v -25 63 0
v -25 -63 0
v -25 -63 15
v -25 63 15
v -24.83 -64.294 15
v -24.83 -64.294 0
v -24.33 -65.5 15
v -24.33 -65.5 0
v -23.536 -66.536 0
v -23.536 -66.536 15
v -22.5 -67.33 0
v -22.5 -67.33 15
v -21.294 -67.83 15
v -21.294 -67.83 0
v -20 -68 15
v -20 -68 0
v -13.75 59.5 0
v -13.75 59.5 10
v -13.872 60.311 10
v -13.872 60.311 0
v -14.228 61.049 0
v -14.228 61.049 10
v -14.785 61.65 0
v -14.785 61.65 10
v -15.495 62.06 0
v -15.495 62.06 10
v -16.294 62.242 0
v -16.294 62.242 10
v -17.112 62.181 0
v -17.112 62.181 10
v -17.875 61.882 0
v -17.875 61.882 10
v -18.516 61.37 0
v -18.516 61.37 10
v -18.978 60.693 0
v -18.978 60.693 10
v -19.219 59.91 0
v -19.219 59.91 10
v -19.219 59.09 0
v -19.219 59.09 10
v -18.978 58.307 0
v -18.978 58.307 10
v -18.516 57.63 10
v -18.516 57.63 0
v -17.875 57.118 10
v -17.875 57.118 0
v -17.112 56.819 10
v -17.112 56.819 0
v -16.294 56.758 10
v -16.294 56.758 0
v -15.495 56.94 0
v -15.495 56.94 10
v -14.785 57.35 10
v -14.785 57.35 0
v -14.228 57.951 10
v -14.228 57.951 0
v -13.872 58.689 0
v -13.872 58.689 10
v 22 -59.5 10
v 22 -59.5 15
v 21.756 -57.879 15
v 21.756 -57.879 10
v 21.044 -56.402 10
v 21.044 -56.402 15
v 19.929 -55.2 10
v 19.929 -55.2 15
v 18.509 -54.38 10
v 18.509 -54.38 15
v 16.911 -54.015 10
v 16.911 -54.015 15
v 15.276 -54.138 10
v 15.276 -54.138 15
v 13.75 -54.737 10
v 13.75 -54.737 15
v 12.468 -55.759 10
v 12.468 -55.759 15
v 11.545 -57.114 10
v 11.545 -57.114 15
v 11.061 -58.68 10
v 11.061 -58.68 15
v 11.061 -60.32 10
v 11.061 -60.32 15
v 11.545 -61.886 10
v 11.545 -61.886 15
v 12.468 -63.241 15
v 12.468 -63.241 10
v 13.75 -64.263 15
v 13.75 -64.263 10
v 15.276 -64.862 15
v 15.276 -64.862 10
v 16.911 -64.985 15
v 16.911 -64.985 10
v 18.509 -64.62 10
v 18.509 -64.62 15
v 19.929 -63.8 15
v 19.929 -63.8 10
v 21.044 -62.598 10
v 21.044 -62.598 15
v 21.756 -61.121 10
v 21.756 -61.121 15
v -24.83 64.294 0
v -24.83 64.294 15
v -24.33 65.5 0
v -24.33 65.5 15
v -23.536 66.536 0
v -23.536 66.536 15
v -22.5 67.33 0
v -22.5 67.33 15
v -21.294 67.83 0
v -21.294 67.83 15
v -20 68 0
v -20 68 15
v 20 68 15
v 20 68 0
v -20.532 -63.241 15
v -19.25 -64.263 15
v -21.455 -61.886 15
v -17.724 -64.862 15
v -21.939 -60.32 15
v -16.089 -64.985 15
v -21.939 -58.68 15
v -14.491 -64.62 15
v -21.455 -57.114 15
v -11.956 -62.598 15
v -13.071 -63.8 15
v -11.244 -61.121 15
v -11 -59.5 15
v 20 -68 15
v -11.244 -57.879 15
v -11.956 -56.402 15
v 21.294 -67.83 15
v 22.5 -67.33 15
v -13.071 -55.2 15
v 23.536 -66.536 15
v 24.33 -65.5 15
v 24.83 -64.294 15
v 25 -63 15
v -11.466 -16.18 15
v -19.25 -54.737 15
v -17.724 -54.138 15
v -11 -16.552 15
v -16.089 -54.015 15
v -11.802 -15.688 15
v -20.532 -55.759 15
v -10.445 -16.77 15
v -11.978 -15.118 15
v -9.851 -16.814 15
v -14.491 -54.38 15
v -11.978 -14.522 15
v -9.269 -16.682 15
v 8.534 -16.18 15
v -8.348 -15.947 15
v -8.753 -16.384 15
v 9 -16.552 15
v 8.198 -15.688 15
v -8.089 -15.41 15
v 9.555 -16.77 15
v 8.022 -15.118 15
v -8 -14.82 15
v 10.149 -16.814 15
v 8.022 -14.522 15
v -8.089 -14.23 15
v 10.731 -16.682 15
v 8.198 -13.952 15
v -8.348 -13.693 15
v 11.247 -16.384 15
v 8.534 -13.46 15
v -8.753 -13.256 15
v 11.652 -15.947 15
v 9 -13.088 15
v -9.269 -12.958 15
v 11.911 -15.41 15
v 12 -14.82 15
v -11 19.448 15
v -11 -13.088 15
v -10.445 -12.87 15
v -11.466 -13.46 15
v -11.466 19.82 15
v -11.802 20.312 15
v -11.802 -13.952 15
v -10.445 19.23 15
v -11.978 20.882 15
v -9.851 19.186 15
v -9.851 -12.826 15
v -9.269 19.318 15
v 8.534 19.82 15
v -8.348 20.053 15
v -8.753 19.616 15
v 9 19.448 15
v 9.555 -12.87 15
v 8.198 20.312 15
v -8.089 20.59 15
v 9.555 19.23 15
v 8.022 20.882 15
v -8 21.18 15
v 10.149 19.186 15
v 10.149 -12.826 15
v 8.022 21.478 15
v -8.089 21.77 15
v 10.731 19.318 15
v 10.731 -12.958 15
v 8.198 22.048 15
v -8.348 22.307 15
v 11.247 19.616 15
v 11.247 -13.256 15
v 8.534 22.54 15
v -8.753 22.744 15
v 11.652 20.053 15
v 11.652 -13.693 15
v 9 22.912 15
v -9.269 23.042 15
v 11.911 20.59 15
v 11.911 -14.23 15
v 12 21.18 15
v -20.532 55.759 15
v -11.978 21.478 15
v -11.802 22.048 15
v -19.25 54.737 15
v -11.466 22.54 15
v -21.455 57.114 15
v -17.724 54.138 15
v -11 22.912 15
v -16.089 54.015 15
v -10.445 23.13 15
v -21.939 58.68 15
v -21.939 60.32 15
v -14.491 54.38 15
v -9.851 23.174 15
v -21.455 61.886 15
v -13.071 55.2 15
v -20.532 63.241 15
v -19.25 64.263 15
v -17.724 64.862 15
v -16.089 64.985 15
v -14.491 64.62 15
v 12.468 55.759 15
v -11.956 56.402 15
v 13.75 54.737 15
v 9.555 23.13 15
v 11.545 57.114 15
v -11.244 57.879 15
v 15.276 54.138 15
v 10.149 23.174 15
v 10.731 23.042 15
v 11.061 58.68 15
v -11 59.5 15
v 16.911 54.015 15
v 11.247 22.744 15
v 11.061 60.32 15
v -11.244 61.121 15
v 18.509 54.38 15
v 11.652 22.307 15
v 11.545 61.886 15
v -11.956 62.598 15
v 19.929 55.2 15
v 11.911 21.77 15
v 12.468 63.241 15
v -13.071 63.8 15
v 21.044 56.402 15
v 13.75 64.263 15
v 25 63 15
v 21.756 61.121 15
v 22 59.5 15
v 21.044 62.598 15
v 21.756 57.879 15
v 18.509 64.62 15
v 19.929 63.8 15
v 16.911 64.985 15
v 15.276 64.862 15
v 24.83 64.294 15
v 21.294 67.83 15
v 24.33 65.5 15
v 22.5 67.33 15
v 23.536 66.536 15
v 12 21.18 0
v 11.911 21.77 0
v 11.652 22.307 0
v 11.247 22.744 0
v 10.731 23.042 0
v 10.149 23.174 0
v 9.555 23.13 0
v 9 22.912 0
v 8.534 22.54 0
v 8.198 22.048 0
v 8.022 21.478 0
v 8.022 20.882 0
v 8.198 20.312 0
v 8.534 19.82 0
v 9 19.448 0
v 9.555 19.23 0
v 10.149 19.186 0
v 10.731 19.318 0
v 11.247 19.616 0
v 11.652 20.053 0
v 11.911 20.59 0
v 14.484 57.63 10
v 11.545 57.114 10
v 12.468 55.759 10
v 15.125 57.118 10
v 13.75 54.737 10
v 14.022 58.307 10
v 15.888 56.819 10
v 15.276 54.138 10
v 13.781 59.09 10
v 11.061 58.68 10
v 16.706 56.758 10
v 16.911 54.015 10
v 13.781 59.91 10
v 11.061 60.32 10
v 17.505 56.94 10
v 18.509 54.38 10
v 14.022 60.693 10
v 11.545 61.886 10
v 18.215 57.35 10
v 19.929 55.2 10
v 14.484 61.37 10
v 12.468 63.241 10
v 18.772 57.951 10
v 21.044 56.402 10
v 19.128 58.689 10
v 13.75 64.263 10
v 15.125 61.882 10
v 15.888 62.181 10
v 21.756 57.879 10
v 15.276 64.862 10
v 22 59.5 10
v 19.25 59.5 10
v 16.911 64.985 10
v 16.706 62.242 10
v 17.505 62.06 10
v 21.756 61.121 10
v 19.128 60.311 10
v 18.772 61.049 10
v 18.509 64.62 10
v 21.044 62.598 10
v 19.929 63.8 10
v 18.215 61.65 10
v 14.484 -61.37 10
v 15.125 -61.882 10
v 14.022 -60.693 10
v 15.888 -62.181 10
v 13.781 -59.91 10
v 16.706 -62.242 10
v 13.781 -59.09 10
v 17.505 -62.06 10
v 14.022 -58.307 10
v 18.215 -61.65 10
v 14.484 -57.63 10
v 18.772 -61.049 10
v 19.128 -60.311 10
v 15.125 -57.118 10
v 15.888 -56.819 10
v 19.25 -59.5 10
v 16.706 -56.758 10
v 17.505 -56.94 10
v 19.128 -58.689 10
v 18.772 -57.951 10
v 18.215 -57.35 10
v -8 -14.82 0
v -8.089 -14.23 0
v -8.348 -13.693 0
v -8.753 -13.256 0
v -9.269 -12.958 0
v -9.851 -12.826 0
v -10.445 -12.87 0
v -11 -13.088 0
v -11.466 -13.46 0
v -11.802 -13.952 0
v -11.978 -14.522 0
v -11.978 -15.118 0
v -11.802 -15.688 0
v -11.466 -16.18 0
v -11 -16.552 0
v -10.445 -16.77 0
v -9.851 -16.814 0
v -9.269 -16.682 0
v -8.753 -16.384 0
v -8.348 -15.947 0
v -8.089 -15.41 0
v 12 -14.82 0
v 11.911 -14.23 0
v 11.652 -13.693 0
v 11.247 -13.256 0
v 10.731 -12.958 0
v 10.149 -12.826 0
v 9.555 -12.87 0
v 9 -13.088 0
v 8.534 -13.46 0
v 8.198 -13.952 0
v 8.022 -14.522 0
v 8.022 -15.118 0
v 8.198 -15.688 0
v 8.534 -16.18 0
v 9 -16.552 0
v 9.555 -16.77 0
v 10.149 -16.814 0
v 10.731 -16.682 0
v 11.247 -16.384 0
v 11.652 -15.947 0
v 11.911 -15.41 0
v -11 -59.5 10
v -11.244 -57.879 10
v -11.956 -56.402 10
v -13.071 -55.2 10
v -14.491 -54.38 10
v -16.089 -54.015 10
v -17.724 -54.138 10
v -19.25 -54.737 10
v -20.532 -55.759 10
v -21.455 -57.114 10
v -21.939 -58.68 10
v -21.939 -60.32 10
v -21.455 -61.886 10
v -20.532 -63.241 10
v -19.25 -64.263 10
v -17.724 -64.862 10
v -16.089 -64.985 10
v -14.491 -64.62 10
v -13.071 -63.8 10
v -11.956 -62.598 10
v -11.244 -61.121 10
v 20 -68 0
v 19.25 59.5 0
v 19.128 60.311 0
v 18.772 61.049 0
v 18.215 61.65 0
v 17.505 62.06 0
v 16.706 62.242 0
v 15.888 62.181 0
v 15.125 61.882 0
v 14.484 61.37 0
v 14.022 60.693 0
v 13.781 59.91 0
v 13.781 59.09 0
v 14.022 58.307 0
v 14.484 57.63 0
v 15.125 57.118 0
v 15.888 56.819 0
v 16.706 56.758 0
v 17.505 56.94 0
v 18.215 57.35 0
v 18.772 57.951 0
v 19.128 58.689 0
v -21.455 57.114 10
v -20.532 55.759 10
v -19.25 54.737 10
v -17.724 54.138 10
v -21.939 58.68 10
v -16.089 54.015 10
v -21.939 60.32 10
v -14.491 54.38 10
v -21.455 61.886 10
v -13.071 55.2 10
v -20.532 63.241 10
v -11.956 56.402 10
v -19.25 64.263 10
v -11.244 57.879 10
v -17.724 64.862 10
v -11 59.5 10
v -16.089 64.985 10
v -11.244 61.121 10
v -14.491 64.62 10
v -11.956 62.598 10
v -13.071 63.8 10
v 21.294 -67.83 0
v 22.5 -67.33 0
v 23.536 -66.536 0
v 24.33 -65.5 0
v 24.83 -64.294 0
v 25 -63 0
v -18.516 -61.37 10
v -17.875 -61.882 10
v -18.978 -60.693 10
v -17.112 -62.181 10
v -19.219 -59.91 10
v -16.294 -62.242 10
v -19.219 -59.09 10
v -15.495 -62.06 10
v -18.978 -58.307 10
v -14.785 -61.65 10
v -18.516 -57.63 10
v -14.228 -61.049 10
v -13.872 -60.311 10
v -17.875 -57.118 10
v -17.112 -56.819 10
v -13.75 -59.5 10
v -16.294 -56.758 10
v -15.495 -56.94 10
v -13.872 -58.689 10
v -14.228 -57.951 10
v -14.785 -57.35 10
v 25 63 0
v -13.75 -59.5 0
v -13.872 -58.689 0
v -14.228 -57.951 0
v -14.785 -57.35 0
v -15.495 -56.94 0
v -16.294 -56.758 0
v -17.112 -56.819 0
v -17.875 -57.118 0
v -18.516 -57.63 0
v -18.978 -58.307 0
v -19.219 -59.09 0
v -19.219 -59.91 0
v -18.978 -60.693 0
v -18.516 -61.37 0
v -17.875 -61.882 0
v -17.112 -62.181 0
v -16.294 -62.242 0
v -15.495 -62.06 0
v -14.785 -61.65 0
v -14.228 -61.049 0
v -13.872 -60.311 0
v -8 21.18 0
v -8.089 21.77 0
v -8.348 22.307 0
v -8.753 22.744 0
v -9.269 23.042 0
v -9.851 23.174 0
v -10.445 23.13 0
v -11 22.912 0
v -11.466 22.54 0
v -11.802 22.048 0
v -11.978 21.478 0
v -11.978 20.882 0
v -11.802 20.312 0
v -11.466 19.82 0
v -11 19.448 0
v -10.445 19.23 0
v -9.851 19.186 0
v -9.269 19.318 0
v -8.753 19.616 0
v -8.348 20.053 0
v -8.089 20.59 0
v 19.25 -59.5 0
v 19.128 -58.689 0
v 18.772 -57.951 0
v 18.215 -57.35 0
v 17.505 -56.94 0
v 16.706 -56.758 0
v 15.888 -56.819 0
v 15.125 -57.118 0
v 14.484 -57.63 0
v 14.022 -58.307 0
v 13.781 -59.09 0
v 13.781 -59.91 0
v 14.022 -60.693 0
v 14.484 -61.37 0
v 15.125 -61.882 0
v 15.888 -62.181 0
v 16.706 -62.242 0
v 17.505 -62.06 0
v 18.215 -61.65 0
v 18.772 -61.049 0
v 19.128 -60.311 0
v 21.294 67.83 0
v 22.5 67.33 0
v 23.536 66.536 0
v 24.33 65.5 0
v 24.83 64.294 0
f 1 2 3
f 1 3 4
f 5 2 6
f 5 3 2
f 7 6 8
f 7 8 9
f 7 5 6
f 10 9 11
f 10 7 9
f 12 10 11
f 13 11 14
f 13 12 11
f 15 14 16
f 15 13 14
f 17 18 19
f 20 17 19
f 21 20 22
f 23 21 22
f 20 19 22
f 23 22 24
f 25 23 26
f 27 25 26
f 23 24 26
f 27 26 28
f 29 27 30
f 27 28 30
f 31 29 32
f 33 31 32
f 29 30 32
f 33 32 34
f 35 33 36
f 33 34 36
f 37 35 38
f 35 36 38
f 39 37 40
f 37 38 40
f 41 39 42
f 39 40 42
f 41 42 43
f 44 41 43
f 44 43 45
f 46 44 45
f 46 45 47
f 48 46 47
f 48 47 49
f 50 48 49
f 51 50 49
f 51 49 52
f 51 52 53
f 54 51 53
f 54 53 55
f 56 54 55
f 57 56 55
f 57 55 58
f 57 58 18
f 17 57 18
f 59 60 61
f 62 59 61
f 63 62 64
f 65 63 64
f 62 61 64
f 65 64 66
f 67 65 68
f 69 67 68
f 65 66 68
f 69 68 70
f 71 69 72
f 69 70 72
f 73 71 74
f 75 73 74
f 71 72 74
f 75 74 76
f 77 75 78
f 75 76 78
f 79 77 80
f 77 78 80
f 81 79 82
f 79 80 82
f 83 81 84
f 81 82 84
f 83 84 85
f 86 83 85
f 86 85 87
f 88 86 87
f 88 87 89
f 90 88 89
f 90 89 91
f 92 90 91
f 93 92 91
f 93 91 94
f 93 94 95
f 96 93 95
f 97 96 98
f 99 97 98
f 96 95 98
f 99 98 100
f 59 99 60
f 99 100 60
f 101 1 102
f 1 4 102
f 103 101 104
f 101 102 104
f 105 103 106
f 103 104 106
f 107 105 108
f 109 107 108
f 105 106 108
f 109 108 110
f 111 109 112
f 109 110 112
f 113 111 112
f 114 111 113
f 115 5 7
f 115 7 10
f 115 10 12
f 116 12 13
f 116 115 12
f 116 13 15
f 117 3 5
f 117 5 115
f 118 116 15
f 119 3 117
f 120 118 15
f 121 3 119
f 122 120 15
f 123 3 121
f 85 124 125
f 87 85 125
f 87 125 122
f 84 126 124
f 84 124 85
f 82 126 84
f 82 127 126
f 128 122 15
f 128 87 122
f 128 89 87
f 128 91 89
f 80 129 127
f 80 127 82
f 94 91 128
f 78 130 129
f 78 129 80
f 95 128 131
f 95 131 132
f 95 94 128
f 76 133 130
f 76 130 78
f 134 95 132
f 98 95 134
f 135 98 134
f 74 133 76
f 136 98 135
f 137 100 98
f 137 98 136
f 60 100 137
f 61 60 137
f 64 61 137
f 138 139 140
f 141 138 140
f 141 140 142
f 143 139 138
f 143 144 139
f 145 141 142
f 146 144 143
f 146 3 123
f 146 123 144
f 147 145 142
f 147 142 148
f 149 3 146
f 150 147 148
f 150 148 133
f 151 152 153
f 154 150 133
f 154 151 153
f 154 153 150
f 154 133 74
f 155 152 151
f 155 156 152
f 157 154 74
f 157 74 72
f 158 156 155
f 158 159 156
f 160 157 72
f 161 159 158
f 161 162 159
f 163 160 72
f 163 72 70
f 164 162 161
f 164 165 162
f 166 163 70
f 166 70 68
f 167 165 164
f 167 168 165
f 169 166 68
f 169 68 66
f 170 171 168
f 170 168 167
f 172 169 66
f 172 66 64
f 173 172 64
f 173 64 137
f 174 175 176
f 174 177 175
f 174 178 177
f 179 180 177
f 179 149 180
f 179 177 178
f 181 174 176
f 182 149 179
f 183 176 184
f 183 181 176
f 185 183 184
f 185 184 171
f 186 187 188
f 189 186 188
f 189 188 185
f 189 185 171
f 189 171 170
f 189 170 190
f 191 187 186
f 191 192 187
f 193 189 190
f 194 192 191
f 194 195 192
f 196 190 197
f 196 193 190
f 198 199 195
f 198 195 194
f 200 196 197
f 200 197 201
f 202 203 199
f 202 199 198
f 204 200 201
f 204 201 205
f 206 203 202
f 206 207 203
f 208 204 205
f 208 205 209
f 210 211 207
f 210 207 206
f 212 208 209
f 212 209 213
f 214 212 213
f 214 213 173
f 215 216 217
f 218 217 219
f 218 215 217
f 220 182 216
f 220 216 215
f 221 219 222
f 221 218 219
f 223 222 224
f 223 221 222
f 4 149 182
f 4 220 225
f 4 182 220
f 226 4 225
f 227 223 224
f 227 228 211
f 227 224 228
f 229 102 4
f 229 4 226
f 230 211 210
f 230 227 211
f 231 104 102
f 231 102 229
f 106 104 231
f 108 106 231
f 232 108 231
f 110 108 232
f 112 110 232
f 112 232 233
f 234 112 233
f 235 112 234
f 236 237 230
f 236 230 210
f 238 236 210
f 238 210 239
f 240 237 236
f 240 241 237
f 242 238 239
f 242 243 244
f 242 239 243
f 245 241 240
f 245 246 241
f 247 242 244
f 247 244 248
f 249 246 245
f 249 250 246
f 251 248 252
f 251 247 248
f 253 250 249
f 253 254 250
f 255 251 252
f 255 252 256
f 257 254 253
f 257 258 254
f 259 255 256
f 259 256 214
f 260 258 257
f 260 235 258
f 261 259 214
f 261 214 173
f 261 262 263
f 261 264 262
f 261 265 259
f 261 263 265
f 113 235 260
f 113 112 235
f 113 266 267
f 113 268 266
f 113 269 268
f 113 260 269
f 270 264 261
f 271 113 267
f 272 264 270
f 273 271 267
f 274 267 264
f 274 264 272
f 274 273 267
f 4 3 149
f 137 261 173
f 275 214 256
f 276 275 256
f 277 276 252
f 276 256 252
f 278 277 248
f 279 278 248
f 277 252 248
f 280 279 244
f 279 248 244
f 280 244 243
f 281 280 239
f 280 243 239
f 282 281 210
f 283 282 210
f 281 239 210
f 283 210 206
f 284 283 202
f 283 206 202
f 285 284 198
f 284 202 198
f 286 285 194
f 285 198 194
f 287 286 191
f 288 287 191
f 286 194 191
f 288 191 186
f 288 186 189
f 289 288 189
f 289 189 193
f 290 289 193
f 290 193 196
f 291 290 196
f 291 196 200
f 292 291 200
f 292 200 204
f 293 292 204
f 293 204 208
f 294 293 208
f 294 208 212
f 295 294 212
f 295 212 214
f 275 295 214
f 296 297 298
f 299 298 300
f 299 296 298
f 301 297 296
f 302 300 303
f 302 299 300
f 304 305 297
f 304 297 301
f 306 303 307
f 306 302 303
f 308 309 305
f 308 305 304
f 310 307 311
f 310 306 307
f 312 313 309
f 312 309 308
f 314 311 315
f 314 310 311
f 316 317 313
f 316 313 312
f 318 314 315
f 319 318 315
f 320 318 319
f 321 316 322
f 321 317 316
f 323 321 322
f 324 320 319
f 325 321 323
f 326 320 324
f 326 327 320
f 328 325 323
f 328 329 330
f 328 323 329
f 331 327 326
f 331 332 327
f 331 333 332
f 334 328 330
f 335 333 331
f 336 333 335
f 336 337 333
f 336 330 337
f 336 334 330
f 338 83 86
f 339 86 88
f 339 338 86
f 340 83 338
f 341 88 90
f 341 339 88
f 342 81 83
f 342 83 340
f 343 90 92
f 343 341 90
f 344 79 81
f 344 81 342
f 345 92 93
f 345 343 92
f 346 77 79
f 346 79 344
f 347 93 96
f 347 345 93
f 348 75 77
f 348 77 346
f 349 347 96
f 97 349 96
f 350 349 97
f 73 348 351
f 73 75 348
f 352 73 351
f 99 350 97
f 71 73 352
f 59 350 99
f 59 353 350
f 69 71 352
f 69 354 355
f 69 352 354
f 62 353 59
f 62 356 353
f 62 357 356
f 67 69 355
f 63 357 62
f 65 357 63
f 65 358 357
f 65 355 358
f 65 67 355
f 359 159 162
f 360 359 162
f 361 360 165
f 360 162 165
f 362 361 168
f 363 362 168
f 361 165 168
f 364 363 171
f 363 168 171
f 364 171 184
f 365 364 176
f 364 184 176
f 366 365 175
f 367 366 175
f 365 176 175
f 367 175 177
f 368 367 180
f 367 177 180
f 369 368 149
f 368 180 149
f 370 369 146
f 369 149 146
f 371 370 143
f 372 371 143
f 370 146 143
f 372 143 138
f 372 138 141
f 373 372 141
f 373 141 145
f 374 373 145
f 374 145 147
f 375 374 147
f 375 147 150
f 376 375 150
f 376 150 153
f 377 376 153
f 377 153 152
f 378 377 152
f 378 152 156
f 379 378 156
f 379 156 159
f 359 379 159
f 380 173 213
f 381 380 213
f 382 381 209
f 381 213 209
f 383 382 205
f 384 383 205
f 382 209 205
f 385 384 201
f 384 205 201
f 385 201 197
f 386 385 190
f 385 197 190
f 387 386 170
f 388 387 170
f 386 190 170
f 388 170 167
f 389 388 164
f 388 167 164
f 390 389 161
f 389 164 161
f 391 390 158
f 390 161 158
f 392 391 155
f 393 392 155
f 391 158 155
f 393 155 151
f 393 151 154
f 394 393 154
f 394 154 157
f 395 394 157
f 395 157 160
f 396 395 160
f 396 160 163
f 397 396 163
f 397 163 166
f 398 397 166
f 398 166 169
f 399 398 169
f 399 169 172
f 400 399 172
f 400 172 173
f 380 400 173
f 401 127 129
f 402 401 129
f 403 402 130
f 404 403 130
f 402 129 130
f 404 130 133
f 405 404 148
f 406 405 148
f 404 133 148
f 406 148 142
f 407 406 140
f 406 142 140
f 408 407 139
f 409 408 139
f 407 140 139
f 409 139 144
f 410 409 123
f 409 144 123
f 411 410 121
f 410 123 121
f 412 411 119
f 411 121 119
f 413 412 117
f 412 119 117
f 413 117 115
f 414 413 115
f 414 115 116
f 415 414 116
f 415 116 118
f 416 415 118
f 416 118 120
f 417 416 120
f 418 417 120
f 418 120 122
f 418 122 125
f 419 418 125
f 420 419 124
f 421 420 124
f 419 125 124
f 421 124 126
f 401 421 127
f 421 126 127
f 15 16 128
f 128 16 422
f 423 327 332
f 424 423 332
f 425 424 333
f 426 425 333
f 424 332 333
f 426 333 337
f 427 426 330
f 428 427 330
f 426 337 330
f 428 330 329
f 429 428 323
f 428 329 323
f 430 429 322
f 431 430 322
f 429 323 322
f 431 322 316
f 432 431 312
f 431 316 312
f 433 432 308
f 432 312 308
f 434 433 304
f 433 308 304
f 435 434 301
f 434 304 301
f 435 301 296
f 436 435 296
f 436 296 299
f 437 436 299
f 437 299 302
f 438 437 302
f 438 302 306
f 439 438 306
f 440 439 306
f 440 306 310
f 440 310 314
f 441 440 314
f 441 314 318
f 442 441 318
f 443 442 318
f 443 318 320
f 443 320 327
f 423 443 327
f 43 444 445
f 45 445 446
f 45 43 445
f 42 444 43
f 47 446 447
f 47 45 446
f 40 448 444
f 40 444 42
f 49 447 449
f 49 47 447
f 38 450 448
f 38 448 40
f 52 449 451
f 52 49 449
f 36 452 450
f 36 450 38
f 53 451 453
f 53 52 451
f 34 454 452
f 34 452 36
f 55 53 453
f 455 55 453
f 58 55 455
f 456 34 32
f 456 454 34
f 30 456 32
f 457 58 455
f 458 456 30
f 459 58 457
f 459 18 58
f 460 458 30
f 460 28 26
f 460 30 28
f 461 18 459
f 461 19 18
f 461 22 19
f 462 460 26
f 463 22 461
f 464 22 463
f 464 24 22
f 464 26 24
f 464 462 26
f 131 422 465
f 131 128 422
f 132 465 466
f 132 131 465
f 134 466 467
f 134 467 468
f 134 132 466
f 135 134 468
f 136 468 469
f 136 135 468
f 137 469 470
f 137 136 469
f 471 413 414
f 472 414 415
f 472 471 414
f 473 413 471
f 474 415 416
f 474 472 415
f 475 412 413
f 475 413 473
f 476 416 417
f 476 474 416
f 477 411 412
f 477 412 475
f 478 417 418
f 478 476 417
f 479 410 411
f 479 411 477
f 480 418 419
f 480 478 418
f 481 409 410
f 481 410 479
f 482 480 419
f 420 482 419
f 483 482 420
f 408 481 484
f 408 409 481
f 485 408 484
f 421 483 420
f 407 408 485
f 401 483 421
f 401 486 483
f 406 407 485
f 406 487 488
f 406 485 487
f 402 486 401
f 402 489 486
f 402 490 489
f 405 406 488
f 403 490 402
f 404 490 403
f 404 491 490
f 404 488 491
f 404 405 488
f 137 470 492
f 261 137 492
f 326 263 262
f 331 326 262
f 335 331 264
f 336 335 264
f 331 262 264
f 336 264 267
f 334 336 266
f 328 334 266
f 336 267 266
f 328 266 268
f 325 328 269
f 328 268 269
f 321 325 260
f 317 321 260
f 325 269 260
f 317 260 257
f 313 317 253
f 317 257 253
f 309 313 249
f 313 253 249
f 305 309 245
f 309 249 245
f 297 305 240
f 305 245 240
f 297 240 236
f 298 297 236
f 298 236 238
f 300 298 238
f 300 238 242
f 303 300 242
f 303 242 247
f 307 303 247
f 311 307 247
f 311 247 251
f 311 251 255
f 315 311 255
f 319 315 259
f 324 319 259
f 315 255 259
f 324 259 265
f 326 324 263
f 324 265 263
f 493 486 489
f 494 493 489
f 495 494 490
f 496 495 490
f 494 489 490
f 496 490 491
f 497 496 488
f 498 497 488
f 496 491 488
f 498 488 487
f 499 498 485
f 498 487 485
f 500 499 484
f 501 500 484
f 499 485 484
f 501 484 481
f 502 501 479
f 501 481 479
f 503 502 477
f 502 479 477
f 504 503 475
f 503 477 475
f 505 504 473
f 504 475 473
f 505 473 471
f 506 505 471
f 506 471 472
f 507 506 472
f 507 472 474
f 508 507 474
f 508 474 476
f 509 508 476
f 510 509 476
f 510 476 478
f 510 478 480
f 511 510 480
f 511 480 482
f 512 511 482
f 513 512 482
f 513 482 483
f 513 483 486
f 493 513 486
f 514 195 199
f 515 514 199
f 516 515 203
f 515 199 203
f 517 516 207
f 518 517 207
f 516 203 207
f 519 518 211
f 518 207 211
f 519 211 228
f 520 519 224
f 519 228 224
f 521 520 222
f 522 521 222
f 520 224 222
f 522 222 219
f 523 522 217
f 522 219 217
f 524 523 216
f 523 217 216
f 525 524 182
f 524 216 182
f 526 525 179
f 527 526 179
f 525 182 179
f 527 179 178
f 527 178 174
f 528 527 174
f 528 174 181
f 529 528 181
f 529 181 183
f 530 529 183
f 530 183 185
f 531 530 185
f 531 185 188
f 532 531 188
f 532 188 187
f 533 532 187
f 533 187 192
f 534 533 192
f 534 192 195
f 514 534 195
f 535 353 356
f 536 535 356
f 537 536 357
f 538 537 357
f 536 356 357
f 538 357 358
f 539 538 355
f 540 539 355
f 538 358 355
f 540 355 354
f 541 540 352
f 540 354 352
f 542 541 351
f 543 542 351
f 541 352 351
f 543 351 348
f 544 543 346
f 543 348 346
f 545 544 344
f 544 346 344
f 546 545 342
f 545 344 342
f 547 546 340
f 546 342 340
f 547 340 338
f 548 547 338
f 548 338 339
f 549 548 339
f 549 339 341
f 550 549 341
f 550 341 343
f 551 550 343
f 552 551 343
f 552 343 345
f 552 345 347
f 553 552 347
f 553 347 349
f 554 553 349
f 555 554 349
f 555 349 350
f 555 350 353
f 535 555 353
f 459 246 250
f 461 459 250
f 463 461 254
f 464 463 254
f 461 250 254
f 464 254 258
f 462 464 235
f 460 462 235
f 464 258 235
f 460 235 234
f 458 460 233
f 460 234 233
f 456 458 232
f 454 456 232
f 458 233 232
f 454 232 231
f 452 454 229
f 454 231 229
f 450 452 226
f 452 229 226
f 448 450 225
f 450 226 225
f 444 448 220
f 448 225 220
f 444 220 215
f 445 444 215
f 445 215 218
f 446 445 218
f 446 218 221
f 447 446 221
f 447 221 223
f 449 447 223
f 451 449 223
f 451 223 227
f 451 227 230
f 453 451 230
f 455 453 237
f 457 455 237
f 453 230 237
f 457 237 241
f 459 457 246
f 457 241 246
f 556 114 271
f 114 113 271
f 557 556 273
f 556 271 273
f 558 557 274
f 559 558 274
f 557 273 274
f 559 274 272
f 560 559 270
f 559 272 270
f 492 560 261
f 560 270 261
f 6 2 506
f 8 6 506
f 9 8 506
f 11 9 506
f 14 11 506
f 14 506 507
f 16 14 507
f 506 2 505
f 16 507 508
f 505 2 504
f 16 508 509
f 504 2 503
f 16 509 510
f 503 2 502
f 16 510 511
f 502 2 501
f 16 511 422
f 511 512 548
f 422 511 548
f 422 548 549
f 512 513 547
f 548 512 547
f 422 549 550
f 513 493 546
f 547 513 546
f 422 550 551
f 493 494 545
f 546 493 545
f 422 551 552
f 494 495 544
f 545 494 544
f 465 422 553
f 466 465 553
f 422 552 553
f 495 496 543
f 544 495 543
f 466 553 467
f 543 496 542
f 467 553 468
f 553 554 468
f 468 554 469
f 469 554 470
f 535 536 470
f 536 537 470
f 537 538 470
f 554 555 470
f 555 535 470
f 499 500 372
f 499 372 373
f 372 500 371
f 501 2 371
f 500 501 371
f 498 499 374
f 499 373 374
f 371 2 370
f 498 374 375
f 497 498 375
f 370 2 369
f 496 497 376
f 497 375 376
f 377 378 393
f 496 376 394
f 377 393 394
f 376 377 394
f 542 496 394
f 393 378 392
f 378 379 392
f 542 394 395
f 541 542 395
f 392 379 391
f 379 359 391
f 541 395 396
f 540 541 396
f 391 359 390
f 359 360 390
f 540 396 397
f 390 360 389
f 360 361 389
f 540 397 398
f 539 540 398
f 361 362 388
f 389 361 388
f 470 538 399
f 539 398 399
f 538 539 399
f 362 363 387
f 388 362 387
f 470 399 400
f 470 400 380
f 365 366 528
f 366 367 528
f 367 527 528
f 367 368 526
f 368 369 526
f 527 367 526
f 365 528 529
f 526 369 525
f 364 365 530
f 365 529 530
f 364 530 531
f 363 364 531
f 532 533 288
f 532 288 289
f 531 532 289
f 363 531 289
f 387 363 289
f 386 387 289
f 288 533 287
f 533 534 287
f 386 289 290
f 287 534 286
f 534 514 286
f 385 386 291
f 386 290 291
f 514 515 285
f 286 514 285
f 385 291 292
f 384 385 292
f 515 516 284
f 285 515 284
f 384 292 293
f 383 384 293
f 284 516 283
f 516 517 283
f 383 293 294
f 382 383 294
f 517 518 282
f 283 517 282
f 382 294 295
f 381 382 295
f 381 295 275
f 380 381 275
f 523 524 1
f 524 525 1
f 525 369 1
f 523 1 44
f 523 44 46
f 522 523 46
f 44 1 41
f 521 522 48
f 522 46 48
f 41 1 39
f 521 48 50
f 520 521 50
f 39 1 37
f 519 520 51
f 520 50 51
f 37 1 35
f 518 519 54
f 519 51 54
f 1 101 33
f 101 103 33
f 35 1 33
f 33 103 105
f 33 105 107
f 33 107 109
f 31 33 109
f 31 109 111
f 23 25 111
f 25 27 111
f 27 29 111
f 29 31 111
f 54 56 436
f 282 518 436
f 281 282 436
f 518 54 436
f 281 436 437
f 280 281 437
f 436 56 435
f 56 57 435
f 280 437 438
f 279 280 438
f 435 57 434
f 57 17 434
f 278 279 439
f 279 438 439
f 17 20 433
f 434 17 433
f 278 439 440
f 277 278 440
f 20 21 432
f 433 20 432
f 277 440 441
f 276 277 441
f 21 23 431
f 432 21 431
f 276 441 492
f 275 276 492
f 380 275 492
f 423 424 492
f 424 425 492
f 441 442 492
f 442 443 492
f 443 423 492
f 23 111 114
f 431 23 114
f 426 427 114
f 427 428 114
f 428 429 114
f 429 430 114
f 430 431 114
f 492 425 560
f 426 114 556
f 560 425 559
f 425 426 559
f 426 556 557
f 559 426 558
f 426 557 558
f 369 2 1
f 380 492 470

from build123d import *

# Parameters (mm, degrees)
SKETCH_W        = 50
SKETCH_H        = 136
PAD_DEPTH       = 15
SKETCH001_R     = 2.75
POCKET_DEPTH    = 15.001
SKETCH002_R     = 5.5
POCKET001_DEPTH = 5
SKETCH003_R     = 2
POCKET002_DEPTH = 15.001
FILLET_R        = 5


with BuildPart() as part:
    # Sketch → Pad (new body)
    with BuildSketch(Plane.XY):
        Rectangle(SKETCH_W, SKETCH_H)
    extrude(amount=PAD_DEPTH)

    # Sketch001 (on Face6 of Pad) → Pocket (cut, through all)
    with BuildSketch(Plane.XY.offset(15)):
        with Locations((-16.5, 59.5)):
            Circle(SKETCH001_R)
        with Locations((16.5, 59.5)):
            Circle(SKETCH001_R)
        with Locations((16.5, -59.5)):
            Circle(SKETCH001_R)
        with Locations((-16.5, -59.5)):
            Circle(SKETCH001_R)
    extrude(amount=-POCKET_DEPTH, mode=Mode.SUBTRACT)

    # Sketch002 (on Face5 of Pocket) → Pocket001 (cut)
    with BuildSketch(Plane.XY.offset(15)):
        with Locations((-16.5, -59.5)):
            Circle(SKETCH002_R)
        with Locations((16.5, -59.5)):
            Circle(SKETCH002_R)
        with Locations((16.5, 59.5)):
            Circle(SKETCH002_R)
        with Locations((-16.5, 59.5)):
            Circle(SKETCH002_R)
    extrude(amount=-POCKET001_DEPTH, mode=Mode.SUBTRACT)

    # Sketch003 (on Face5 of Pocket001) → Pocket002 (cut, through all)
    with BuildSketch(Plane.XY.offset(15)):
        with Locations((10, 21.18)):
            Circle(SKETCH003_R)
        with Locations((-10, 21.18)):
            Circle(SKETCH003_R)
        with Locations((10, -14.82)):
            Circle(SKETCH003_R)
        with Locations((-10, -14.82)):
            Circle(SKETCH003_R)
    extrude(amount=-POCKET002_DEPTH, mode=Mode.SUBTRACT)

    # Fillet
    fillet_edges = [part.edges().sort_by_distance(p)[0] for p in [
        (-25, -68, 7.5),
        (-25, 68, 7.5),
        (25, 68, 7.5),
        (25, -68, 7.5),
    ]]
    fillet(fillet_edges, radius=FILLET_R)


solid = part.part
